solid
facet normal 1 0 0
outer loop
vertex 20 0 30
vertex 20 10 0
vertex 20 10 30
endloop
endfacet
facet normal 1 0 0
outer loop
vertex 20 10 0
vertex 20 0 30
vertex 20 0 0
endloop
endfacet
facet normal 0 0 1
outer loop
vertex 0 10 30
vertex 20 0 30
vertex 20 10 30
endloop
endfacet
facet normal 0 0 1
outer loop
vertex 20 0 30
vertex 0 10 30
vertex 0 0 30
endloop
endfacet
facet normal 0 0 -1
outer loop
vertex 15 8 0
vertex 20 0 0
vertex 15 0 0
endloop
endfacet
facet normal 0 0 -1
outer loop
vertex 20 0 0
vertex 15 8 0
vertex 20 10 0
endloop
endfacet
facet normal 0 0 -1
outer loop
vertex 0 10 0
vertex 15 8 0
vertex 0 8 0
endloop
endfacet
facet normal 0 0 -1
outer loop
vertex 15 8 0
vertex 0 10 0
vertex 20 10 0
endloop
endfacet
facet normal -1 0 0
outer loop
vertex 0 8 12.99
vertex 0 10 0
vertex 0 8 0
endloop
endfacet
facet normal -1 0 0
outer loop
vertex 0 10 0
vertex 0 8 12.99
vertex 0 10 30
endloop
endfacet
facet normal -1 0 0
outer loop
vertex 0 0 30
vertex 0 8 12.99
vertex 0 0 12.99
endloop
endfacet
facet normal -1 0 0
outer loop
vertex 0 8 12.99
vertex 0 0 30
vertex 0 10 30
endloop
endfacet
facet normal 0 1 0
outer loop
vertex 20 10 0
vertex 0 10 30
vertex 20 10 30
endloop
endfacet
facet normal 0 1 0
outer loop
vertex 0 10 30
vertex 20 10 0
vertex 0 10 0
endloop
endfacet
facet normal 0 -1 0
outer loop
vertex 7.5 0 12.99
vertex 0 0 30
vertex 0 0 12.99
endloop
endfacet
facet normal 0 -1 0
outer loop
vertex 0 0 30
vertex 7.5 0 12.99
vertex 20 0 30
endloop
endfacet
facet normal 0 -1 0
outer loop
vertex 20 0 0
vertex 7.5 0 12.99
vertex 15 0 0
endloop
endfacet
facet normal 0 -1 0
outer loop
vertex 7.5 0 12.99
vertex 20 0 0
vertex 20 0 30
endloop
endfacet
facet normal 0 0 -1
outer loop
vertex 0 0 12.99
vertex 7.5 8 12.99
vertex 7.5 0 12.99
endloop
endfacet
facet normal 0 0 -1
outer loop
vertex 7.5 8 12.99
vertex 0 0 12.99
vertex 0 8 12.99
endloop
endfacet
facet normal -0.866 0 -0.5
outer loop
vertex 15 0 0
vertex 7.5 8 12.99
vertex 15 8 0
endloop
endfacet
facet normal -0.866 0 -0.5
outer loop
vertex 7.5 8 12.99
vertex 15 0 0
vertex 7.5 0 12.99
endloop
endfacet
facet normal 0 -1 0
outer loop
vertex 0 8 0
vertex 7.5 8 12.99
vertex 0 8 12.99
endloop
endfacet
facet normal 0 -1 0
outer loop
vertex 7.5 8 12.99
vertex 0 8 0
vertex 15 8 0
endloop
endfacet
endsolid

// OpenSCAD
altura = 30;

difference(){
//translate([40,0,0])
cube([20,10,altura],false);

translate([0,8,0])
rotate([90, 0 ,0])
cylinder(h=20, r=15, $fn=6);
}
